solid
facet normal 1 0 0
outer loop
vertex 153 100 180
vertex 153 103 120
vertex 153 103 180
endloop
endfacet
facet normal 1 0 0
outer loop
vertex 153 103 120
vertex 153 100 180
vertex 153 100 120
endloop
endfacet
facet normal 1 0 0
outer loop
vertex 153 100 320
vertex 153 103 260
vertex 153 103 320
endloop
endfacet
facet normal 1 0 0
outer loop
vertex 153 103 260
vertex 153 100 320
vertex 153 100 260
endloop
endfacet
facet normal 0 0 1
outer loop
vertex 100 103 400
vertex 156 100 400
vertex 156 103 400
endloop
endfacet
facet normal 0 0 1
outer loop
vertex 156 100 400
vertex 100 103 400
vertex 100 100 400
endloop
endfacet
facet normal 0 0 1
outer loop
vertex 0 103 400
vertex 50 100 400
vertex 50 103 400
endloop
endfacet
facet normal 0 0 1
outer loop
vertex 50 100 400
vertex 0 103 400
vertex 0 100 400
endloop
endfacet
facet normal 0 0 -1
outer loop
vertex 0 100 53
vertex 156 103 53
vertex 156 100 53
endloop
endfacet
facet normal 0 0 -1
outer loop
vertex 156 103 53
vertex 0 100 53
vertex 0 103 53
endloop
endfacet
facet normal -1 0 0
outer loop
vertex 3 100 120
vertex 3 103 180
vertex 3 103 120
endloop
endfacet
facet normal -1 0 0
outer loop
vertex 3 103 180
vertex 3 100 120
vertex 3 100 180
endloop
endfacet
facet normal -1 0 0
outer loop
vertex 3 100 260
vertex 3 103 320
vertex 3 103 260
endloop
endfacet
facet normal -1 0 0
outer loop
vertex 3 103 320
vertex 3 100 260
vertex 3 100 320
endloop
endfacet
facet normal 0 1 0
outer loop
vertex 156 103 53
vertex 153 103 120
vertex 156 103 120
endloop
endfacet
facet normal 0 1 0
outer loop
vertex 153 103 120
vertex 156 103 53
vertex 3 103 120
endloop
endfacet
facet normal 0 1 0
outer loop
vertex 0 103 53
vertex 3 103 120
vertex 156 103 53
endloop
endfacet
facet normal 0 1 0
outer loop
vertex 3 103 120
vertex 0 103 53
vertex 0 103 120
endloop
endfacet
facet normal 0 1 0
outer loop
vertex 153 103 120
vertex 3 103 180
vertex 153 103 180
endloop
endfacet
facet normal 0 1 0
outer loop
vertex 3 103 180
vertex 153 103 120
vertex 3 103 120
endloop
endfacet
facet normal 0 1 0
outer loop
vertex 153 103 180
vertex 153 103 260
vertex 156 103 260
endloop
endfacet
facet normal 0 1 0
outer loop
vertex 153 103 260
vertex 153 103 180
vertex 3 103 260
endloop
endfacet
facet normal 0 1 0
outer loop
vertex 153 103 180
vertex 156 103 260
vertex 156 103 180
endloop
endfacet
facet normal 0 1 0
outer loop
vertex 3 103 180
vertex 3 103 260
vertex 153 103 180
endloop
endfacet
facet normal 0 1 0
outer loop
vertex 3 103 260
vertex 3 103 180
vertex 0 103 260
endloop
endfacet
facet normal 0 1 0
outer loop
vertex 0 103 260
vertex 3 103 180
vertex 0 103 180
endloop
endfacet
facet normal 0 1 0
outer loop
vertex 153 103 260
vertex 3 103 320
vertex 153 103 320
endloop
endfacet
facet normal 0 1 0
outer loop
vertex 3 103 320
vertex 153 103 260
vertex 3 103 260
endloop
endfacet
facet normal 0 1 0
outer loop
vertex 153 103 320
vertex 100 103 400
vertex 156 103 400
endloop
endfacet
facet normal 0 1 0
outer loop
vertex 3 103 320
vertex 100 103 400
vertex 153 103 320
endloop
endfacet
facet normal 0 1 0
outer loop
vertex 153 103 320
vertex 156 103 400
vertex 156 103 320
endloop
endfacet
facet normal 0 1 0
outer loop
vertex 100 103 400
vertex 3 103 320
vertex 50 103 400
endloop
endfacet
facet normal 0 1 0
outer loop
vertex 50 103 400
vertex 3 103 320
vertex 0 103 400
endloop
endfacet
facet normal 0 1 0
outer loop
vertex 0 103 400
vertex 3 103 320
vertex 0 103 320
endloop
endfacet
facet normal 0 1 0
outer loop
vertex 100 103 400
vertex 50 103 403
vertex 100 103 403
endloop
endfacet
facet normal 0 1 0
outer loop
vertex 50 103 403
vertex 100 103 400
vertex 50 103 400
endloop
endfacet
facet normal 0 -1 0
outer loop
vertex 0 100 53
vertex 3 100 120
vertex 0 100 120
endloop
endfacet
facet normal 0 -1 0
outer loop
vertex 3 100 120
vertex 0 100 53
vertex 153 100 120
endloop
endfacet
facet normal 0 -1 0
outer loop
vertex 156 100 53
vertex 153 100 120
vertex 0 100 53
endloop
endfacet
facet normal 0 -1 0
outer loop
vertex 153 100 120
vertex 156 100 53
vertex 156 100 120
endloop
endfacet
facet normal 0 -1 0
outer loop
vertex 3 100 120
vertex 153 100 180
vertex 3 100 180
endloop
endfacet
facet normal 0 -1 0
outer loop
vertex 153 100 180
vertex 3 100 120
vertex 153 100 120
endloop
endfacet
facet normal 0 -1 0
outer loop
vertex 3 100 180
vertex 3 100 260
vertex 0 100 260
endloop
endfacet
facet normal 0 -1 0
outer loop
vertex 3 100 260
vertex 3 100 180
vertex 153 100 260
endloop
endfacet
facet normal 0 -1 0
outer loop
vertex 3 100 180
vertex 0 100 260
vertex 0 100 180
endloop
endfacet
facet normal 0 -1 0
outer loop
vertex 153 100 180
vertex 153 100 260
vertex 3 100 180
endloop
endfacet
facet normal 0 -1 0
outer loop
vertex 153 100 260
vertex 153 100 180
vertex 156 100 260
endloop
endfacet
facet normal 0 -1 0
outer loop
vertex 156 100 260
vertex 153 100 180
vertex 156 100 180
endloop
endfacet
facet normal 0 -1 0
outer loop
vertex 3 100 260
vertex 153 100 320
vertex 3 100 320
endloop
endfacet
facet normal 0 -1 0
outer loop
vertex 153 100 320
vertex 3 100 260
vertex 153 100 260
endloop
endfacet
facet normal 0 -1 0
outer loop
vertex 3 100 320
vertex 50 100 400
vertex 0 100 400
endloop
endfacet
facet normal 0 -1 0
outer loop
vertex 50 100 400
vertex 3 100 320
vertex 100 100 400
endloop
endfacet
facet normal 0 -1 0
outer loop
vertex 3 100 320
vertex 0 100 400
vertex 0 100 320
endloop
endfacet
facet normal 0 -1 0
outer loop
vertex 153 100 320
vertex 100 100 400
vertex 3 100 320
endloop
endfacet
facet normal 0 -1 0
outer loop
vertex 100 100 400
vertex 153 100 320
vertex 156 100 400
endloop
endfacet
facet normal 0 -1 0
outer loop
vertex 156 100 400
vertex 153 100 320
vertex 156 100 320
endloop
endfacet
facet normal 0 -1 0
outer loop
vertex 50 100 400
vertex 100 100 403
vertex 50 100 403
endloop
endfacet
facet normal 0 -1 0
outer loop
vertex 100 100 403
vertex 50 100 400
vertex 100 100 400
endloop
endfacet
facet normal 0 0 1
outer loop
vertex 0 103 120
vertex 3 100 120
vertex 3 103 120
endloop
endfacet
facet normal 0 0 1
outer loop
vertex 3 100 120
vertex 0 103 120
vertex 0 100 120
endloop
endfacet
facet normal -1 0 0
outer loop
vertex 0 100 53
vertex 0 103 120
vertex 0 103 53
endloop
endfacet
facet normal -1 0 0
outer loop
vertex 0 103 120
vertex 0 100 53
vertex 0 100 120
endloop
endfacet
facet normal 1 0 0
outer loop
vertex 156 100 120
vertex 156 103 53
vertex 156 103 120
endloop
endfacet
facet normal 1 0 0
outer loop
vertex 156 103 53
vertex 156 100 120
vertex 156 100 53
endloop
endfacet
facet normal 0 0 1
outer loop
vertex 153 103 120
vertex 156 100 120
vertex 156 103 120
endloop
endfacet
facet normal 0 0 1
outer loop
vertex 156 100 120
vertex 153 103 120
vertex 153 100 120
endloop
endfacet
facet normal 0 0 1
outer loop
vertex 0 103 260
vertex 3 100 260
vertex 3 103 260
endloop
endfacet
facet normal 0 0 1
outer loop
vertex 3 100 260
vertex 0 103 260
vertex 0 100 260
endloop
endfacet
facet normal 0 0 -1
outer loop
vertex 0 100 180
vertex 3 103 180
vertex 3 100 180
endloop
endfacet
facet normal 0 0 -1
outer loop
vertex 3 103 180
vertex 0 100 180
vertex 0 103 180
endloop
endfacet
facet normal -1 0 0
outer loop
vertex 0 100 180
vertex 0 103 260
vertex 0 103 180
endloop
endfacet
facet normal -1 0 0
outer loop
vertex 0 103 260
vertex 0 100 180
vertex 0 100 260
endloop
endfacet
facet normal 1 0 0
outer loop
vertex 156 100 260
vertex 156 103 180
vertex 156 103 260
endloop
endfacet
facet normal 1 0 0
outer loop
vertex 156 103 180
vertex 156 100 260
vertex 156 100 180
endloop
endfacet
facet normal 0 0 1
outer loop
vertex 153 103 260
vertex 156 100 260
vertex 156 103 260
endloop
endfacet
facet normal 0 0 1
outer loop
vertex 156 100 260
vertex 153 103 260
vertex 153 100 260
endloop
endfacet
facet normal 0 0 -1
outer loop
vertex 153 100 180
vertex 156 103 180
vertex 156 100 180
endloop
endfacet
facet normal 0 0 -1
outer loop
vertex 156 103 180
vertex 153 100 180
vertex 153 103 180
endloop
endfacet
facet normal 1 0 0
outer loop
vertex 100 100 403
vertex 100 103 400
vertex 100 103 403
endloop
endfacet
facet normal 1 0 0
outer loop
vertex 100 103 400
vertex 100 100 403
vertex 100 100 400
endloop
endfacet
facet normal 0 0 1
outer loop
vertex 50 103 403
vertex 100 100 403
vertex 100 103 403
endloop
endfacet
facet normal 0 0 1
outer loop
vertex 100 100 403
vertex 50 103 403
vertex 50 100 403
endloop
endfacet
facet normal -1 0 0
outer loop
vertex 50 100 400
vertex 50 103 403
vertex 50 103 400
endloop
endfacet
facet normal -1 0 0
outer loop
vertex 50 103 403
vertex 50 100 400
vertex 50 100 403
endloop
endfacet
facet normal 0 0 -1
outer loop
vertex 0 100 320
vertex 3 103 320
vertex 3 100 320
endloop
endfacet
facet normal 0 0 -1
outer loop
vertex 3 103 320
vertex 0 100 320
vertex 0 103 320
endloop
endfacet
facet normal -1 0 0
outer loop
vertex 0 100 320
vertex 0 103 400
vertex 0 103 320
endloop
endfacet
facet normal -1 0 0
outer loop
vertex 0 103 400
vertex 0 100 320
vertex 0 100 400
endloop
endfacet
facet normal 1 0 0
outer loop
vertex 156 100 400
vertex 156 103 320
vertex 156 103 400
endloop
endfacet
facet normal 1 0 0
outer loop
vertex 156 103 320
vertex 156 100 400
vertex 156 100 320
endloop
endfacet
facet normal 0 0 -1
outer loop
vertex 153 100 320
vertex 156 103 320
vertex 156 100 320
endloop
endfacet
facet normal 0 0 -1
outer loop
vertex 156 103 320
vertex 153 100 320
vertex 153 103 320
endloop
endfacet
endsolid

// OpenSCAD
module part05(){
    translate([3,100,53])color("grey") cube([150,3,347]);
    translate([0,100,53])color("grey") cube([3,3,67]);
    translate([153,100,53])color("gray") cube([3,3,67]);
    translate([0,100,180])color("grey") cube([3,3,80]);
    translate([153,100,180])color("grey") cube([3,3,80]);
    
    // connector top
    translate([50,100,400]) color("grey") cube([50,3,3]);
    // corresponding element on part06
    //translate([5,30.3,40]) color("red") cube([5,0.3,0.3]);
    
    // connectors left
    translate([0,100,320])color("grey") cube([3,3,80]);
    
    // connectors right
    translate([153,100,320])color("grey") cube([3,3,80]);
}

//use <part01.scad>;
//use <part02.scad>;
//use <part03.scad>;
//use <part04.scad>;

//part01();
//part02();
//part03();
//// zweites Seitenteil
//translate([15.3,0,0]) part03();
//part04();
part05();
